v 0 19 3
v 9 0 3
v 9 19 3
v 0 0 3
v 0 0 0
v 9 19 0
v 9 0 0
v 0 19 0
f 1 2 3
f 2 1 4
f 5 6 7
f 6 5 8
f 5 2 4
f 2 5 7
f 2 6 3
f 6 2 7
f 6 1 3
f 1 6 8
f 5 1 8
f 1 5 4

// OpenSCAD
// Generated by SolidPython 1.0.1 on 2020-07-29 00:46:55


cube(size = [9, 19, 3]);
/***********************************************
*********      SolidPython code:      **********
************************************************
 
# import packages: SolidPython
from solid import *
from solid.utils import *
from itertools import chain, combinations, permutations


class Resize:

    def __init__(self, scad_file):
        self.scad_file = scad_file
        #self.scad_file = import_scad(scad_file)
        # cone/cylinder param:
        self.r1 = 0
        self.r2 = 0
        self.h = 0
        # rectangular prism param:
        self.w = 0
        self.l = 0
        # ellipse param:
        self.r = 0

    # import OpenScad code (file name corresponds to shape)


    # classify shape + parameters
    def assign(self, param1, param2, param3):
        if self.scad_file == 'cone.scad':
            self.r1 = param1
            self.r2 = param2
            self.h = param3
        elif self.scad_file == 'cylinder.scad':
            self.r1 = param1
            self.r2 = param2
            self.h = param3
        elif self.scad_file == 'rectangularPrism.scad':
            self.h = param1
            self.l = param2
            self.w = param3
        else:
            self.r = param1
            self.h = param2

    # resize parameters
    def iterate(self):
        x = range(3, 20, 2)
        i = 1
        if self.scad_file == 'cone.scad':
            tempList = list(permutations(x, 2))
            for temp in tempList:
                param1 = temp[0]
                param2 = temp[1]
                filepath = 'produced_scad_files/' + 'cone' + str(param1) + '_' + str(param2) + '_' + '.scad'
                scad_render_to_file(cylinder(h=param1, r1=param2, r2=0), filepath)

        elif self.scad_file == 'cylinder.scad':
            tempList = list(permutations(x, 3))
            for temp in tempList:
                param1 = temp[0]
                param2 = temp[1]
                filepath = 'produced_scad_files/' + 'cylinder' + str(param1) + '_' + str(param2) + '_' + '.scad'
                scad_render_to_file(cylinder(h=param1, r1=param2, r2=param2), filepath)

        elif self.scad_file == 'rectangularPrism.scad':
            tempList = list(permutations(x, 3))
            for temp in tempList:
                param1 = temp[0]
                param2 = temp[1]
                param3 = temp[2]
                filepath = 'produced_scad_files/' + 'rectangularPrism' + str(param1) + '_' + str(param2) + '_' + str(
                    param3) + '.scad'
                scad_render_to_file(cube(size=(param1, param2, param3)), filepath)

        elif self.scad_file == 'ellipse.scad':
            tempList = list(permutations(x, 4))
            for temp in tempList:
                param1 = temp[0]
                param2 = temp[1]
                param3 = temp[2]
                param4 = temp[3]
                filepath = 'produced_scad_files/' + 'ellipse' + str(param1) + '_' + str(param2) + '_' + str(param3) + '_' + str(param4) + '.scad'
                scad_render_to_file(scale([param1, param2, param3])(sphere(r=param4)), filepath)

    def render_to_scadfile(self):
        scad_render_to_file(scad, 'example.scad') 
 
************************************************/
